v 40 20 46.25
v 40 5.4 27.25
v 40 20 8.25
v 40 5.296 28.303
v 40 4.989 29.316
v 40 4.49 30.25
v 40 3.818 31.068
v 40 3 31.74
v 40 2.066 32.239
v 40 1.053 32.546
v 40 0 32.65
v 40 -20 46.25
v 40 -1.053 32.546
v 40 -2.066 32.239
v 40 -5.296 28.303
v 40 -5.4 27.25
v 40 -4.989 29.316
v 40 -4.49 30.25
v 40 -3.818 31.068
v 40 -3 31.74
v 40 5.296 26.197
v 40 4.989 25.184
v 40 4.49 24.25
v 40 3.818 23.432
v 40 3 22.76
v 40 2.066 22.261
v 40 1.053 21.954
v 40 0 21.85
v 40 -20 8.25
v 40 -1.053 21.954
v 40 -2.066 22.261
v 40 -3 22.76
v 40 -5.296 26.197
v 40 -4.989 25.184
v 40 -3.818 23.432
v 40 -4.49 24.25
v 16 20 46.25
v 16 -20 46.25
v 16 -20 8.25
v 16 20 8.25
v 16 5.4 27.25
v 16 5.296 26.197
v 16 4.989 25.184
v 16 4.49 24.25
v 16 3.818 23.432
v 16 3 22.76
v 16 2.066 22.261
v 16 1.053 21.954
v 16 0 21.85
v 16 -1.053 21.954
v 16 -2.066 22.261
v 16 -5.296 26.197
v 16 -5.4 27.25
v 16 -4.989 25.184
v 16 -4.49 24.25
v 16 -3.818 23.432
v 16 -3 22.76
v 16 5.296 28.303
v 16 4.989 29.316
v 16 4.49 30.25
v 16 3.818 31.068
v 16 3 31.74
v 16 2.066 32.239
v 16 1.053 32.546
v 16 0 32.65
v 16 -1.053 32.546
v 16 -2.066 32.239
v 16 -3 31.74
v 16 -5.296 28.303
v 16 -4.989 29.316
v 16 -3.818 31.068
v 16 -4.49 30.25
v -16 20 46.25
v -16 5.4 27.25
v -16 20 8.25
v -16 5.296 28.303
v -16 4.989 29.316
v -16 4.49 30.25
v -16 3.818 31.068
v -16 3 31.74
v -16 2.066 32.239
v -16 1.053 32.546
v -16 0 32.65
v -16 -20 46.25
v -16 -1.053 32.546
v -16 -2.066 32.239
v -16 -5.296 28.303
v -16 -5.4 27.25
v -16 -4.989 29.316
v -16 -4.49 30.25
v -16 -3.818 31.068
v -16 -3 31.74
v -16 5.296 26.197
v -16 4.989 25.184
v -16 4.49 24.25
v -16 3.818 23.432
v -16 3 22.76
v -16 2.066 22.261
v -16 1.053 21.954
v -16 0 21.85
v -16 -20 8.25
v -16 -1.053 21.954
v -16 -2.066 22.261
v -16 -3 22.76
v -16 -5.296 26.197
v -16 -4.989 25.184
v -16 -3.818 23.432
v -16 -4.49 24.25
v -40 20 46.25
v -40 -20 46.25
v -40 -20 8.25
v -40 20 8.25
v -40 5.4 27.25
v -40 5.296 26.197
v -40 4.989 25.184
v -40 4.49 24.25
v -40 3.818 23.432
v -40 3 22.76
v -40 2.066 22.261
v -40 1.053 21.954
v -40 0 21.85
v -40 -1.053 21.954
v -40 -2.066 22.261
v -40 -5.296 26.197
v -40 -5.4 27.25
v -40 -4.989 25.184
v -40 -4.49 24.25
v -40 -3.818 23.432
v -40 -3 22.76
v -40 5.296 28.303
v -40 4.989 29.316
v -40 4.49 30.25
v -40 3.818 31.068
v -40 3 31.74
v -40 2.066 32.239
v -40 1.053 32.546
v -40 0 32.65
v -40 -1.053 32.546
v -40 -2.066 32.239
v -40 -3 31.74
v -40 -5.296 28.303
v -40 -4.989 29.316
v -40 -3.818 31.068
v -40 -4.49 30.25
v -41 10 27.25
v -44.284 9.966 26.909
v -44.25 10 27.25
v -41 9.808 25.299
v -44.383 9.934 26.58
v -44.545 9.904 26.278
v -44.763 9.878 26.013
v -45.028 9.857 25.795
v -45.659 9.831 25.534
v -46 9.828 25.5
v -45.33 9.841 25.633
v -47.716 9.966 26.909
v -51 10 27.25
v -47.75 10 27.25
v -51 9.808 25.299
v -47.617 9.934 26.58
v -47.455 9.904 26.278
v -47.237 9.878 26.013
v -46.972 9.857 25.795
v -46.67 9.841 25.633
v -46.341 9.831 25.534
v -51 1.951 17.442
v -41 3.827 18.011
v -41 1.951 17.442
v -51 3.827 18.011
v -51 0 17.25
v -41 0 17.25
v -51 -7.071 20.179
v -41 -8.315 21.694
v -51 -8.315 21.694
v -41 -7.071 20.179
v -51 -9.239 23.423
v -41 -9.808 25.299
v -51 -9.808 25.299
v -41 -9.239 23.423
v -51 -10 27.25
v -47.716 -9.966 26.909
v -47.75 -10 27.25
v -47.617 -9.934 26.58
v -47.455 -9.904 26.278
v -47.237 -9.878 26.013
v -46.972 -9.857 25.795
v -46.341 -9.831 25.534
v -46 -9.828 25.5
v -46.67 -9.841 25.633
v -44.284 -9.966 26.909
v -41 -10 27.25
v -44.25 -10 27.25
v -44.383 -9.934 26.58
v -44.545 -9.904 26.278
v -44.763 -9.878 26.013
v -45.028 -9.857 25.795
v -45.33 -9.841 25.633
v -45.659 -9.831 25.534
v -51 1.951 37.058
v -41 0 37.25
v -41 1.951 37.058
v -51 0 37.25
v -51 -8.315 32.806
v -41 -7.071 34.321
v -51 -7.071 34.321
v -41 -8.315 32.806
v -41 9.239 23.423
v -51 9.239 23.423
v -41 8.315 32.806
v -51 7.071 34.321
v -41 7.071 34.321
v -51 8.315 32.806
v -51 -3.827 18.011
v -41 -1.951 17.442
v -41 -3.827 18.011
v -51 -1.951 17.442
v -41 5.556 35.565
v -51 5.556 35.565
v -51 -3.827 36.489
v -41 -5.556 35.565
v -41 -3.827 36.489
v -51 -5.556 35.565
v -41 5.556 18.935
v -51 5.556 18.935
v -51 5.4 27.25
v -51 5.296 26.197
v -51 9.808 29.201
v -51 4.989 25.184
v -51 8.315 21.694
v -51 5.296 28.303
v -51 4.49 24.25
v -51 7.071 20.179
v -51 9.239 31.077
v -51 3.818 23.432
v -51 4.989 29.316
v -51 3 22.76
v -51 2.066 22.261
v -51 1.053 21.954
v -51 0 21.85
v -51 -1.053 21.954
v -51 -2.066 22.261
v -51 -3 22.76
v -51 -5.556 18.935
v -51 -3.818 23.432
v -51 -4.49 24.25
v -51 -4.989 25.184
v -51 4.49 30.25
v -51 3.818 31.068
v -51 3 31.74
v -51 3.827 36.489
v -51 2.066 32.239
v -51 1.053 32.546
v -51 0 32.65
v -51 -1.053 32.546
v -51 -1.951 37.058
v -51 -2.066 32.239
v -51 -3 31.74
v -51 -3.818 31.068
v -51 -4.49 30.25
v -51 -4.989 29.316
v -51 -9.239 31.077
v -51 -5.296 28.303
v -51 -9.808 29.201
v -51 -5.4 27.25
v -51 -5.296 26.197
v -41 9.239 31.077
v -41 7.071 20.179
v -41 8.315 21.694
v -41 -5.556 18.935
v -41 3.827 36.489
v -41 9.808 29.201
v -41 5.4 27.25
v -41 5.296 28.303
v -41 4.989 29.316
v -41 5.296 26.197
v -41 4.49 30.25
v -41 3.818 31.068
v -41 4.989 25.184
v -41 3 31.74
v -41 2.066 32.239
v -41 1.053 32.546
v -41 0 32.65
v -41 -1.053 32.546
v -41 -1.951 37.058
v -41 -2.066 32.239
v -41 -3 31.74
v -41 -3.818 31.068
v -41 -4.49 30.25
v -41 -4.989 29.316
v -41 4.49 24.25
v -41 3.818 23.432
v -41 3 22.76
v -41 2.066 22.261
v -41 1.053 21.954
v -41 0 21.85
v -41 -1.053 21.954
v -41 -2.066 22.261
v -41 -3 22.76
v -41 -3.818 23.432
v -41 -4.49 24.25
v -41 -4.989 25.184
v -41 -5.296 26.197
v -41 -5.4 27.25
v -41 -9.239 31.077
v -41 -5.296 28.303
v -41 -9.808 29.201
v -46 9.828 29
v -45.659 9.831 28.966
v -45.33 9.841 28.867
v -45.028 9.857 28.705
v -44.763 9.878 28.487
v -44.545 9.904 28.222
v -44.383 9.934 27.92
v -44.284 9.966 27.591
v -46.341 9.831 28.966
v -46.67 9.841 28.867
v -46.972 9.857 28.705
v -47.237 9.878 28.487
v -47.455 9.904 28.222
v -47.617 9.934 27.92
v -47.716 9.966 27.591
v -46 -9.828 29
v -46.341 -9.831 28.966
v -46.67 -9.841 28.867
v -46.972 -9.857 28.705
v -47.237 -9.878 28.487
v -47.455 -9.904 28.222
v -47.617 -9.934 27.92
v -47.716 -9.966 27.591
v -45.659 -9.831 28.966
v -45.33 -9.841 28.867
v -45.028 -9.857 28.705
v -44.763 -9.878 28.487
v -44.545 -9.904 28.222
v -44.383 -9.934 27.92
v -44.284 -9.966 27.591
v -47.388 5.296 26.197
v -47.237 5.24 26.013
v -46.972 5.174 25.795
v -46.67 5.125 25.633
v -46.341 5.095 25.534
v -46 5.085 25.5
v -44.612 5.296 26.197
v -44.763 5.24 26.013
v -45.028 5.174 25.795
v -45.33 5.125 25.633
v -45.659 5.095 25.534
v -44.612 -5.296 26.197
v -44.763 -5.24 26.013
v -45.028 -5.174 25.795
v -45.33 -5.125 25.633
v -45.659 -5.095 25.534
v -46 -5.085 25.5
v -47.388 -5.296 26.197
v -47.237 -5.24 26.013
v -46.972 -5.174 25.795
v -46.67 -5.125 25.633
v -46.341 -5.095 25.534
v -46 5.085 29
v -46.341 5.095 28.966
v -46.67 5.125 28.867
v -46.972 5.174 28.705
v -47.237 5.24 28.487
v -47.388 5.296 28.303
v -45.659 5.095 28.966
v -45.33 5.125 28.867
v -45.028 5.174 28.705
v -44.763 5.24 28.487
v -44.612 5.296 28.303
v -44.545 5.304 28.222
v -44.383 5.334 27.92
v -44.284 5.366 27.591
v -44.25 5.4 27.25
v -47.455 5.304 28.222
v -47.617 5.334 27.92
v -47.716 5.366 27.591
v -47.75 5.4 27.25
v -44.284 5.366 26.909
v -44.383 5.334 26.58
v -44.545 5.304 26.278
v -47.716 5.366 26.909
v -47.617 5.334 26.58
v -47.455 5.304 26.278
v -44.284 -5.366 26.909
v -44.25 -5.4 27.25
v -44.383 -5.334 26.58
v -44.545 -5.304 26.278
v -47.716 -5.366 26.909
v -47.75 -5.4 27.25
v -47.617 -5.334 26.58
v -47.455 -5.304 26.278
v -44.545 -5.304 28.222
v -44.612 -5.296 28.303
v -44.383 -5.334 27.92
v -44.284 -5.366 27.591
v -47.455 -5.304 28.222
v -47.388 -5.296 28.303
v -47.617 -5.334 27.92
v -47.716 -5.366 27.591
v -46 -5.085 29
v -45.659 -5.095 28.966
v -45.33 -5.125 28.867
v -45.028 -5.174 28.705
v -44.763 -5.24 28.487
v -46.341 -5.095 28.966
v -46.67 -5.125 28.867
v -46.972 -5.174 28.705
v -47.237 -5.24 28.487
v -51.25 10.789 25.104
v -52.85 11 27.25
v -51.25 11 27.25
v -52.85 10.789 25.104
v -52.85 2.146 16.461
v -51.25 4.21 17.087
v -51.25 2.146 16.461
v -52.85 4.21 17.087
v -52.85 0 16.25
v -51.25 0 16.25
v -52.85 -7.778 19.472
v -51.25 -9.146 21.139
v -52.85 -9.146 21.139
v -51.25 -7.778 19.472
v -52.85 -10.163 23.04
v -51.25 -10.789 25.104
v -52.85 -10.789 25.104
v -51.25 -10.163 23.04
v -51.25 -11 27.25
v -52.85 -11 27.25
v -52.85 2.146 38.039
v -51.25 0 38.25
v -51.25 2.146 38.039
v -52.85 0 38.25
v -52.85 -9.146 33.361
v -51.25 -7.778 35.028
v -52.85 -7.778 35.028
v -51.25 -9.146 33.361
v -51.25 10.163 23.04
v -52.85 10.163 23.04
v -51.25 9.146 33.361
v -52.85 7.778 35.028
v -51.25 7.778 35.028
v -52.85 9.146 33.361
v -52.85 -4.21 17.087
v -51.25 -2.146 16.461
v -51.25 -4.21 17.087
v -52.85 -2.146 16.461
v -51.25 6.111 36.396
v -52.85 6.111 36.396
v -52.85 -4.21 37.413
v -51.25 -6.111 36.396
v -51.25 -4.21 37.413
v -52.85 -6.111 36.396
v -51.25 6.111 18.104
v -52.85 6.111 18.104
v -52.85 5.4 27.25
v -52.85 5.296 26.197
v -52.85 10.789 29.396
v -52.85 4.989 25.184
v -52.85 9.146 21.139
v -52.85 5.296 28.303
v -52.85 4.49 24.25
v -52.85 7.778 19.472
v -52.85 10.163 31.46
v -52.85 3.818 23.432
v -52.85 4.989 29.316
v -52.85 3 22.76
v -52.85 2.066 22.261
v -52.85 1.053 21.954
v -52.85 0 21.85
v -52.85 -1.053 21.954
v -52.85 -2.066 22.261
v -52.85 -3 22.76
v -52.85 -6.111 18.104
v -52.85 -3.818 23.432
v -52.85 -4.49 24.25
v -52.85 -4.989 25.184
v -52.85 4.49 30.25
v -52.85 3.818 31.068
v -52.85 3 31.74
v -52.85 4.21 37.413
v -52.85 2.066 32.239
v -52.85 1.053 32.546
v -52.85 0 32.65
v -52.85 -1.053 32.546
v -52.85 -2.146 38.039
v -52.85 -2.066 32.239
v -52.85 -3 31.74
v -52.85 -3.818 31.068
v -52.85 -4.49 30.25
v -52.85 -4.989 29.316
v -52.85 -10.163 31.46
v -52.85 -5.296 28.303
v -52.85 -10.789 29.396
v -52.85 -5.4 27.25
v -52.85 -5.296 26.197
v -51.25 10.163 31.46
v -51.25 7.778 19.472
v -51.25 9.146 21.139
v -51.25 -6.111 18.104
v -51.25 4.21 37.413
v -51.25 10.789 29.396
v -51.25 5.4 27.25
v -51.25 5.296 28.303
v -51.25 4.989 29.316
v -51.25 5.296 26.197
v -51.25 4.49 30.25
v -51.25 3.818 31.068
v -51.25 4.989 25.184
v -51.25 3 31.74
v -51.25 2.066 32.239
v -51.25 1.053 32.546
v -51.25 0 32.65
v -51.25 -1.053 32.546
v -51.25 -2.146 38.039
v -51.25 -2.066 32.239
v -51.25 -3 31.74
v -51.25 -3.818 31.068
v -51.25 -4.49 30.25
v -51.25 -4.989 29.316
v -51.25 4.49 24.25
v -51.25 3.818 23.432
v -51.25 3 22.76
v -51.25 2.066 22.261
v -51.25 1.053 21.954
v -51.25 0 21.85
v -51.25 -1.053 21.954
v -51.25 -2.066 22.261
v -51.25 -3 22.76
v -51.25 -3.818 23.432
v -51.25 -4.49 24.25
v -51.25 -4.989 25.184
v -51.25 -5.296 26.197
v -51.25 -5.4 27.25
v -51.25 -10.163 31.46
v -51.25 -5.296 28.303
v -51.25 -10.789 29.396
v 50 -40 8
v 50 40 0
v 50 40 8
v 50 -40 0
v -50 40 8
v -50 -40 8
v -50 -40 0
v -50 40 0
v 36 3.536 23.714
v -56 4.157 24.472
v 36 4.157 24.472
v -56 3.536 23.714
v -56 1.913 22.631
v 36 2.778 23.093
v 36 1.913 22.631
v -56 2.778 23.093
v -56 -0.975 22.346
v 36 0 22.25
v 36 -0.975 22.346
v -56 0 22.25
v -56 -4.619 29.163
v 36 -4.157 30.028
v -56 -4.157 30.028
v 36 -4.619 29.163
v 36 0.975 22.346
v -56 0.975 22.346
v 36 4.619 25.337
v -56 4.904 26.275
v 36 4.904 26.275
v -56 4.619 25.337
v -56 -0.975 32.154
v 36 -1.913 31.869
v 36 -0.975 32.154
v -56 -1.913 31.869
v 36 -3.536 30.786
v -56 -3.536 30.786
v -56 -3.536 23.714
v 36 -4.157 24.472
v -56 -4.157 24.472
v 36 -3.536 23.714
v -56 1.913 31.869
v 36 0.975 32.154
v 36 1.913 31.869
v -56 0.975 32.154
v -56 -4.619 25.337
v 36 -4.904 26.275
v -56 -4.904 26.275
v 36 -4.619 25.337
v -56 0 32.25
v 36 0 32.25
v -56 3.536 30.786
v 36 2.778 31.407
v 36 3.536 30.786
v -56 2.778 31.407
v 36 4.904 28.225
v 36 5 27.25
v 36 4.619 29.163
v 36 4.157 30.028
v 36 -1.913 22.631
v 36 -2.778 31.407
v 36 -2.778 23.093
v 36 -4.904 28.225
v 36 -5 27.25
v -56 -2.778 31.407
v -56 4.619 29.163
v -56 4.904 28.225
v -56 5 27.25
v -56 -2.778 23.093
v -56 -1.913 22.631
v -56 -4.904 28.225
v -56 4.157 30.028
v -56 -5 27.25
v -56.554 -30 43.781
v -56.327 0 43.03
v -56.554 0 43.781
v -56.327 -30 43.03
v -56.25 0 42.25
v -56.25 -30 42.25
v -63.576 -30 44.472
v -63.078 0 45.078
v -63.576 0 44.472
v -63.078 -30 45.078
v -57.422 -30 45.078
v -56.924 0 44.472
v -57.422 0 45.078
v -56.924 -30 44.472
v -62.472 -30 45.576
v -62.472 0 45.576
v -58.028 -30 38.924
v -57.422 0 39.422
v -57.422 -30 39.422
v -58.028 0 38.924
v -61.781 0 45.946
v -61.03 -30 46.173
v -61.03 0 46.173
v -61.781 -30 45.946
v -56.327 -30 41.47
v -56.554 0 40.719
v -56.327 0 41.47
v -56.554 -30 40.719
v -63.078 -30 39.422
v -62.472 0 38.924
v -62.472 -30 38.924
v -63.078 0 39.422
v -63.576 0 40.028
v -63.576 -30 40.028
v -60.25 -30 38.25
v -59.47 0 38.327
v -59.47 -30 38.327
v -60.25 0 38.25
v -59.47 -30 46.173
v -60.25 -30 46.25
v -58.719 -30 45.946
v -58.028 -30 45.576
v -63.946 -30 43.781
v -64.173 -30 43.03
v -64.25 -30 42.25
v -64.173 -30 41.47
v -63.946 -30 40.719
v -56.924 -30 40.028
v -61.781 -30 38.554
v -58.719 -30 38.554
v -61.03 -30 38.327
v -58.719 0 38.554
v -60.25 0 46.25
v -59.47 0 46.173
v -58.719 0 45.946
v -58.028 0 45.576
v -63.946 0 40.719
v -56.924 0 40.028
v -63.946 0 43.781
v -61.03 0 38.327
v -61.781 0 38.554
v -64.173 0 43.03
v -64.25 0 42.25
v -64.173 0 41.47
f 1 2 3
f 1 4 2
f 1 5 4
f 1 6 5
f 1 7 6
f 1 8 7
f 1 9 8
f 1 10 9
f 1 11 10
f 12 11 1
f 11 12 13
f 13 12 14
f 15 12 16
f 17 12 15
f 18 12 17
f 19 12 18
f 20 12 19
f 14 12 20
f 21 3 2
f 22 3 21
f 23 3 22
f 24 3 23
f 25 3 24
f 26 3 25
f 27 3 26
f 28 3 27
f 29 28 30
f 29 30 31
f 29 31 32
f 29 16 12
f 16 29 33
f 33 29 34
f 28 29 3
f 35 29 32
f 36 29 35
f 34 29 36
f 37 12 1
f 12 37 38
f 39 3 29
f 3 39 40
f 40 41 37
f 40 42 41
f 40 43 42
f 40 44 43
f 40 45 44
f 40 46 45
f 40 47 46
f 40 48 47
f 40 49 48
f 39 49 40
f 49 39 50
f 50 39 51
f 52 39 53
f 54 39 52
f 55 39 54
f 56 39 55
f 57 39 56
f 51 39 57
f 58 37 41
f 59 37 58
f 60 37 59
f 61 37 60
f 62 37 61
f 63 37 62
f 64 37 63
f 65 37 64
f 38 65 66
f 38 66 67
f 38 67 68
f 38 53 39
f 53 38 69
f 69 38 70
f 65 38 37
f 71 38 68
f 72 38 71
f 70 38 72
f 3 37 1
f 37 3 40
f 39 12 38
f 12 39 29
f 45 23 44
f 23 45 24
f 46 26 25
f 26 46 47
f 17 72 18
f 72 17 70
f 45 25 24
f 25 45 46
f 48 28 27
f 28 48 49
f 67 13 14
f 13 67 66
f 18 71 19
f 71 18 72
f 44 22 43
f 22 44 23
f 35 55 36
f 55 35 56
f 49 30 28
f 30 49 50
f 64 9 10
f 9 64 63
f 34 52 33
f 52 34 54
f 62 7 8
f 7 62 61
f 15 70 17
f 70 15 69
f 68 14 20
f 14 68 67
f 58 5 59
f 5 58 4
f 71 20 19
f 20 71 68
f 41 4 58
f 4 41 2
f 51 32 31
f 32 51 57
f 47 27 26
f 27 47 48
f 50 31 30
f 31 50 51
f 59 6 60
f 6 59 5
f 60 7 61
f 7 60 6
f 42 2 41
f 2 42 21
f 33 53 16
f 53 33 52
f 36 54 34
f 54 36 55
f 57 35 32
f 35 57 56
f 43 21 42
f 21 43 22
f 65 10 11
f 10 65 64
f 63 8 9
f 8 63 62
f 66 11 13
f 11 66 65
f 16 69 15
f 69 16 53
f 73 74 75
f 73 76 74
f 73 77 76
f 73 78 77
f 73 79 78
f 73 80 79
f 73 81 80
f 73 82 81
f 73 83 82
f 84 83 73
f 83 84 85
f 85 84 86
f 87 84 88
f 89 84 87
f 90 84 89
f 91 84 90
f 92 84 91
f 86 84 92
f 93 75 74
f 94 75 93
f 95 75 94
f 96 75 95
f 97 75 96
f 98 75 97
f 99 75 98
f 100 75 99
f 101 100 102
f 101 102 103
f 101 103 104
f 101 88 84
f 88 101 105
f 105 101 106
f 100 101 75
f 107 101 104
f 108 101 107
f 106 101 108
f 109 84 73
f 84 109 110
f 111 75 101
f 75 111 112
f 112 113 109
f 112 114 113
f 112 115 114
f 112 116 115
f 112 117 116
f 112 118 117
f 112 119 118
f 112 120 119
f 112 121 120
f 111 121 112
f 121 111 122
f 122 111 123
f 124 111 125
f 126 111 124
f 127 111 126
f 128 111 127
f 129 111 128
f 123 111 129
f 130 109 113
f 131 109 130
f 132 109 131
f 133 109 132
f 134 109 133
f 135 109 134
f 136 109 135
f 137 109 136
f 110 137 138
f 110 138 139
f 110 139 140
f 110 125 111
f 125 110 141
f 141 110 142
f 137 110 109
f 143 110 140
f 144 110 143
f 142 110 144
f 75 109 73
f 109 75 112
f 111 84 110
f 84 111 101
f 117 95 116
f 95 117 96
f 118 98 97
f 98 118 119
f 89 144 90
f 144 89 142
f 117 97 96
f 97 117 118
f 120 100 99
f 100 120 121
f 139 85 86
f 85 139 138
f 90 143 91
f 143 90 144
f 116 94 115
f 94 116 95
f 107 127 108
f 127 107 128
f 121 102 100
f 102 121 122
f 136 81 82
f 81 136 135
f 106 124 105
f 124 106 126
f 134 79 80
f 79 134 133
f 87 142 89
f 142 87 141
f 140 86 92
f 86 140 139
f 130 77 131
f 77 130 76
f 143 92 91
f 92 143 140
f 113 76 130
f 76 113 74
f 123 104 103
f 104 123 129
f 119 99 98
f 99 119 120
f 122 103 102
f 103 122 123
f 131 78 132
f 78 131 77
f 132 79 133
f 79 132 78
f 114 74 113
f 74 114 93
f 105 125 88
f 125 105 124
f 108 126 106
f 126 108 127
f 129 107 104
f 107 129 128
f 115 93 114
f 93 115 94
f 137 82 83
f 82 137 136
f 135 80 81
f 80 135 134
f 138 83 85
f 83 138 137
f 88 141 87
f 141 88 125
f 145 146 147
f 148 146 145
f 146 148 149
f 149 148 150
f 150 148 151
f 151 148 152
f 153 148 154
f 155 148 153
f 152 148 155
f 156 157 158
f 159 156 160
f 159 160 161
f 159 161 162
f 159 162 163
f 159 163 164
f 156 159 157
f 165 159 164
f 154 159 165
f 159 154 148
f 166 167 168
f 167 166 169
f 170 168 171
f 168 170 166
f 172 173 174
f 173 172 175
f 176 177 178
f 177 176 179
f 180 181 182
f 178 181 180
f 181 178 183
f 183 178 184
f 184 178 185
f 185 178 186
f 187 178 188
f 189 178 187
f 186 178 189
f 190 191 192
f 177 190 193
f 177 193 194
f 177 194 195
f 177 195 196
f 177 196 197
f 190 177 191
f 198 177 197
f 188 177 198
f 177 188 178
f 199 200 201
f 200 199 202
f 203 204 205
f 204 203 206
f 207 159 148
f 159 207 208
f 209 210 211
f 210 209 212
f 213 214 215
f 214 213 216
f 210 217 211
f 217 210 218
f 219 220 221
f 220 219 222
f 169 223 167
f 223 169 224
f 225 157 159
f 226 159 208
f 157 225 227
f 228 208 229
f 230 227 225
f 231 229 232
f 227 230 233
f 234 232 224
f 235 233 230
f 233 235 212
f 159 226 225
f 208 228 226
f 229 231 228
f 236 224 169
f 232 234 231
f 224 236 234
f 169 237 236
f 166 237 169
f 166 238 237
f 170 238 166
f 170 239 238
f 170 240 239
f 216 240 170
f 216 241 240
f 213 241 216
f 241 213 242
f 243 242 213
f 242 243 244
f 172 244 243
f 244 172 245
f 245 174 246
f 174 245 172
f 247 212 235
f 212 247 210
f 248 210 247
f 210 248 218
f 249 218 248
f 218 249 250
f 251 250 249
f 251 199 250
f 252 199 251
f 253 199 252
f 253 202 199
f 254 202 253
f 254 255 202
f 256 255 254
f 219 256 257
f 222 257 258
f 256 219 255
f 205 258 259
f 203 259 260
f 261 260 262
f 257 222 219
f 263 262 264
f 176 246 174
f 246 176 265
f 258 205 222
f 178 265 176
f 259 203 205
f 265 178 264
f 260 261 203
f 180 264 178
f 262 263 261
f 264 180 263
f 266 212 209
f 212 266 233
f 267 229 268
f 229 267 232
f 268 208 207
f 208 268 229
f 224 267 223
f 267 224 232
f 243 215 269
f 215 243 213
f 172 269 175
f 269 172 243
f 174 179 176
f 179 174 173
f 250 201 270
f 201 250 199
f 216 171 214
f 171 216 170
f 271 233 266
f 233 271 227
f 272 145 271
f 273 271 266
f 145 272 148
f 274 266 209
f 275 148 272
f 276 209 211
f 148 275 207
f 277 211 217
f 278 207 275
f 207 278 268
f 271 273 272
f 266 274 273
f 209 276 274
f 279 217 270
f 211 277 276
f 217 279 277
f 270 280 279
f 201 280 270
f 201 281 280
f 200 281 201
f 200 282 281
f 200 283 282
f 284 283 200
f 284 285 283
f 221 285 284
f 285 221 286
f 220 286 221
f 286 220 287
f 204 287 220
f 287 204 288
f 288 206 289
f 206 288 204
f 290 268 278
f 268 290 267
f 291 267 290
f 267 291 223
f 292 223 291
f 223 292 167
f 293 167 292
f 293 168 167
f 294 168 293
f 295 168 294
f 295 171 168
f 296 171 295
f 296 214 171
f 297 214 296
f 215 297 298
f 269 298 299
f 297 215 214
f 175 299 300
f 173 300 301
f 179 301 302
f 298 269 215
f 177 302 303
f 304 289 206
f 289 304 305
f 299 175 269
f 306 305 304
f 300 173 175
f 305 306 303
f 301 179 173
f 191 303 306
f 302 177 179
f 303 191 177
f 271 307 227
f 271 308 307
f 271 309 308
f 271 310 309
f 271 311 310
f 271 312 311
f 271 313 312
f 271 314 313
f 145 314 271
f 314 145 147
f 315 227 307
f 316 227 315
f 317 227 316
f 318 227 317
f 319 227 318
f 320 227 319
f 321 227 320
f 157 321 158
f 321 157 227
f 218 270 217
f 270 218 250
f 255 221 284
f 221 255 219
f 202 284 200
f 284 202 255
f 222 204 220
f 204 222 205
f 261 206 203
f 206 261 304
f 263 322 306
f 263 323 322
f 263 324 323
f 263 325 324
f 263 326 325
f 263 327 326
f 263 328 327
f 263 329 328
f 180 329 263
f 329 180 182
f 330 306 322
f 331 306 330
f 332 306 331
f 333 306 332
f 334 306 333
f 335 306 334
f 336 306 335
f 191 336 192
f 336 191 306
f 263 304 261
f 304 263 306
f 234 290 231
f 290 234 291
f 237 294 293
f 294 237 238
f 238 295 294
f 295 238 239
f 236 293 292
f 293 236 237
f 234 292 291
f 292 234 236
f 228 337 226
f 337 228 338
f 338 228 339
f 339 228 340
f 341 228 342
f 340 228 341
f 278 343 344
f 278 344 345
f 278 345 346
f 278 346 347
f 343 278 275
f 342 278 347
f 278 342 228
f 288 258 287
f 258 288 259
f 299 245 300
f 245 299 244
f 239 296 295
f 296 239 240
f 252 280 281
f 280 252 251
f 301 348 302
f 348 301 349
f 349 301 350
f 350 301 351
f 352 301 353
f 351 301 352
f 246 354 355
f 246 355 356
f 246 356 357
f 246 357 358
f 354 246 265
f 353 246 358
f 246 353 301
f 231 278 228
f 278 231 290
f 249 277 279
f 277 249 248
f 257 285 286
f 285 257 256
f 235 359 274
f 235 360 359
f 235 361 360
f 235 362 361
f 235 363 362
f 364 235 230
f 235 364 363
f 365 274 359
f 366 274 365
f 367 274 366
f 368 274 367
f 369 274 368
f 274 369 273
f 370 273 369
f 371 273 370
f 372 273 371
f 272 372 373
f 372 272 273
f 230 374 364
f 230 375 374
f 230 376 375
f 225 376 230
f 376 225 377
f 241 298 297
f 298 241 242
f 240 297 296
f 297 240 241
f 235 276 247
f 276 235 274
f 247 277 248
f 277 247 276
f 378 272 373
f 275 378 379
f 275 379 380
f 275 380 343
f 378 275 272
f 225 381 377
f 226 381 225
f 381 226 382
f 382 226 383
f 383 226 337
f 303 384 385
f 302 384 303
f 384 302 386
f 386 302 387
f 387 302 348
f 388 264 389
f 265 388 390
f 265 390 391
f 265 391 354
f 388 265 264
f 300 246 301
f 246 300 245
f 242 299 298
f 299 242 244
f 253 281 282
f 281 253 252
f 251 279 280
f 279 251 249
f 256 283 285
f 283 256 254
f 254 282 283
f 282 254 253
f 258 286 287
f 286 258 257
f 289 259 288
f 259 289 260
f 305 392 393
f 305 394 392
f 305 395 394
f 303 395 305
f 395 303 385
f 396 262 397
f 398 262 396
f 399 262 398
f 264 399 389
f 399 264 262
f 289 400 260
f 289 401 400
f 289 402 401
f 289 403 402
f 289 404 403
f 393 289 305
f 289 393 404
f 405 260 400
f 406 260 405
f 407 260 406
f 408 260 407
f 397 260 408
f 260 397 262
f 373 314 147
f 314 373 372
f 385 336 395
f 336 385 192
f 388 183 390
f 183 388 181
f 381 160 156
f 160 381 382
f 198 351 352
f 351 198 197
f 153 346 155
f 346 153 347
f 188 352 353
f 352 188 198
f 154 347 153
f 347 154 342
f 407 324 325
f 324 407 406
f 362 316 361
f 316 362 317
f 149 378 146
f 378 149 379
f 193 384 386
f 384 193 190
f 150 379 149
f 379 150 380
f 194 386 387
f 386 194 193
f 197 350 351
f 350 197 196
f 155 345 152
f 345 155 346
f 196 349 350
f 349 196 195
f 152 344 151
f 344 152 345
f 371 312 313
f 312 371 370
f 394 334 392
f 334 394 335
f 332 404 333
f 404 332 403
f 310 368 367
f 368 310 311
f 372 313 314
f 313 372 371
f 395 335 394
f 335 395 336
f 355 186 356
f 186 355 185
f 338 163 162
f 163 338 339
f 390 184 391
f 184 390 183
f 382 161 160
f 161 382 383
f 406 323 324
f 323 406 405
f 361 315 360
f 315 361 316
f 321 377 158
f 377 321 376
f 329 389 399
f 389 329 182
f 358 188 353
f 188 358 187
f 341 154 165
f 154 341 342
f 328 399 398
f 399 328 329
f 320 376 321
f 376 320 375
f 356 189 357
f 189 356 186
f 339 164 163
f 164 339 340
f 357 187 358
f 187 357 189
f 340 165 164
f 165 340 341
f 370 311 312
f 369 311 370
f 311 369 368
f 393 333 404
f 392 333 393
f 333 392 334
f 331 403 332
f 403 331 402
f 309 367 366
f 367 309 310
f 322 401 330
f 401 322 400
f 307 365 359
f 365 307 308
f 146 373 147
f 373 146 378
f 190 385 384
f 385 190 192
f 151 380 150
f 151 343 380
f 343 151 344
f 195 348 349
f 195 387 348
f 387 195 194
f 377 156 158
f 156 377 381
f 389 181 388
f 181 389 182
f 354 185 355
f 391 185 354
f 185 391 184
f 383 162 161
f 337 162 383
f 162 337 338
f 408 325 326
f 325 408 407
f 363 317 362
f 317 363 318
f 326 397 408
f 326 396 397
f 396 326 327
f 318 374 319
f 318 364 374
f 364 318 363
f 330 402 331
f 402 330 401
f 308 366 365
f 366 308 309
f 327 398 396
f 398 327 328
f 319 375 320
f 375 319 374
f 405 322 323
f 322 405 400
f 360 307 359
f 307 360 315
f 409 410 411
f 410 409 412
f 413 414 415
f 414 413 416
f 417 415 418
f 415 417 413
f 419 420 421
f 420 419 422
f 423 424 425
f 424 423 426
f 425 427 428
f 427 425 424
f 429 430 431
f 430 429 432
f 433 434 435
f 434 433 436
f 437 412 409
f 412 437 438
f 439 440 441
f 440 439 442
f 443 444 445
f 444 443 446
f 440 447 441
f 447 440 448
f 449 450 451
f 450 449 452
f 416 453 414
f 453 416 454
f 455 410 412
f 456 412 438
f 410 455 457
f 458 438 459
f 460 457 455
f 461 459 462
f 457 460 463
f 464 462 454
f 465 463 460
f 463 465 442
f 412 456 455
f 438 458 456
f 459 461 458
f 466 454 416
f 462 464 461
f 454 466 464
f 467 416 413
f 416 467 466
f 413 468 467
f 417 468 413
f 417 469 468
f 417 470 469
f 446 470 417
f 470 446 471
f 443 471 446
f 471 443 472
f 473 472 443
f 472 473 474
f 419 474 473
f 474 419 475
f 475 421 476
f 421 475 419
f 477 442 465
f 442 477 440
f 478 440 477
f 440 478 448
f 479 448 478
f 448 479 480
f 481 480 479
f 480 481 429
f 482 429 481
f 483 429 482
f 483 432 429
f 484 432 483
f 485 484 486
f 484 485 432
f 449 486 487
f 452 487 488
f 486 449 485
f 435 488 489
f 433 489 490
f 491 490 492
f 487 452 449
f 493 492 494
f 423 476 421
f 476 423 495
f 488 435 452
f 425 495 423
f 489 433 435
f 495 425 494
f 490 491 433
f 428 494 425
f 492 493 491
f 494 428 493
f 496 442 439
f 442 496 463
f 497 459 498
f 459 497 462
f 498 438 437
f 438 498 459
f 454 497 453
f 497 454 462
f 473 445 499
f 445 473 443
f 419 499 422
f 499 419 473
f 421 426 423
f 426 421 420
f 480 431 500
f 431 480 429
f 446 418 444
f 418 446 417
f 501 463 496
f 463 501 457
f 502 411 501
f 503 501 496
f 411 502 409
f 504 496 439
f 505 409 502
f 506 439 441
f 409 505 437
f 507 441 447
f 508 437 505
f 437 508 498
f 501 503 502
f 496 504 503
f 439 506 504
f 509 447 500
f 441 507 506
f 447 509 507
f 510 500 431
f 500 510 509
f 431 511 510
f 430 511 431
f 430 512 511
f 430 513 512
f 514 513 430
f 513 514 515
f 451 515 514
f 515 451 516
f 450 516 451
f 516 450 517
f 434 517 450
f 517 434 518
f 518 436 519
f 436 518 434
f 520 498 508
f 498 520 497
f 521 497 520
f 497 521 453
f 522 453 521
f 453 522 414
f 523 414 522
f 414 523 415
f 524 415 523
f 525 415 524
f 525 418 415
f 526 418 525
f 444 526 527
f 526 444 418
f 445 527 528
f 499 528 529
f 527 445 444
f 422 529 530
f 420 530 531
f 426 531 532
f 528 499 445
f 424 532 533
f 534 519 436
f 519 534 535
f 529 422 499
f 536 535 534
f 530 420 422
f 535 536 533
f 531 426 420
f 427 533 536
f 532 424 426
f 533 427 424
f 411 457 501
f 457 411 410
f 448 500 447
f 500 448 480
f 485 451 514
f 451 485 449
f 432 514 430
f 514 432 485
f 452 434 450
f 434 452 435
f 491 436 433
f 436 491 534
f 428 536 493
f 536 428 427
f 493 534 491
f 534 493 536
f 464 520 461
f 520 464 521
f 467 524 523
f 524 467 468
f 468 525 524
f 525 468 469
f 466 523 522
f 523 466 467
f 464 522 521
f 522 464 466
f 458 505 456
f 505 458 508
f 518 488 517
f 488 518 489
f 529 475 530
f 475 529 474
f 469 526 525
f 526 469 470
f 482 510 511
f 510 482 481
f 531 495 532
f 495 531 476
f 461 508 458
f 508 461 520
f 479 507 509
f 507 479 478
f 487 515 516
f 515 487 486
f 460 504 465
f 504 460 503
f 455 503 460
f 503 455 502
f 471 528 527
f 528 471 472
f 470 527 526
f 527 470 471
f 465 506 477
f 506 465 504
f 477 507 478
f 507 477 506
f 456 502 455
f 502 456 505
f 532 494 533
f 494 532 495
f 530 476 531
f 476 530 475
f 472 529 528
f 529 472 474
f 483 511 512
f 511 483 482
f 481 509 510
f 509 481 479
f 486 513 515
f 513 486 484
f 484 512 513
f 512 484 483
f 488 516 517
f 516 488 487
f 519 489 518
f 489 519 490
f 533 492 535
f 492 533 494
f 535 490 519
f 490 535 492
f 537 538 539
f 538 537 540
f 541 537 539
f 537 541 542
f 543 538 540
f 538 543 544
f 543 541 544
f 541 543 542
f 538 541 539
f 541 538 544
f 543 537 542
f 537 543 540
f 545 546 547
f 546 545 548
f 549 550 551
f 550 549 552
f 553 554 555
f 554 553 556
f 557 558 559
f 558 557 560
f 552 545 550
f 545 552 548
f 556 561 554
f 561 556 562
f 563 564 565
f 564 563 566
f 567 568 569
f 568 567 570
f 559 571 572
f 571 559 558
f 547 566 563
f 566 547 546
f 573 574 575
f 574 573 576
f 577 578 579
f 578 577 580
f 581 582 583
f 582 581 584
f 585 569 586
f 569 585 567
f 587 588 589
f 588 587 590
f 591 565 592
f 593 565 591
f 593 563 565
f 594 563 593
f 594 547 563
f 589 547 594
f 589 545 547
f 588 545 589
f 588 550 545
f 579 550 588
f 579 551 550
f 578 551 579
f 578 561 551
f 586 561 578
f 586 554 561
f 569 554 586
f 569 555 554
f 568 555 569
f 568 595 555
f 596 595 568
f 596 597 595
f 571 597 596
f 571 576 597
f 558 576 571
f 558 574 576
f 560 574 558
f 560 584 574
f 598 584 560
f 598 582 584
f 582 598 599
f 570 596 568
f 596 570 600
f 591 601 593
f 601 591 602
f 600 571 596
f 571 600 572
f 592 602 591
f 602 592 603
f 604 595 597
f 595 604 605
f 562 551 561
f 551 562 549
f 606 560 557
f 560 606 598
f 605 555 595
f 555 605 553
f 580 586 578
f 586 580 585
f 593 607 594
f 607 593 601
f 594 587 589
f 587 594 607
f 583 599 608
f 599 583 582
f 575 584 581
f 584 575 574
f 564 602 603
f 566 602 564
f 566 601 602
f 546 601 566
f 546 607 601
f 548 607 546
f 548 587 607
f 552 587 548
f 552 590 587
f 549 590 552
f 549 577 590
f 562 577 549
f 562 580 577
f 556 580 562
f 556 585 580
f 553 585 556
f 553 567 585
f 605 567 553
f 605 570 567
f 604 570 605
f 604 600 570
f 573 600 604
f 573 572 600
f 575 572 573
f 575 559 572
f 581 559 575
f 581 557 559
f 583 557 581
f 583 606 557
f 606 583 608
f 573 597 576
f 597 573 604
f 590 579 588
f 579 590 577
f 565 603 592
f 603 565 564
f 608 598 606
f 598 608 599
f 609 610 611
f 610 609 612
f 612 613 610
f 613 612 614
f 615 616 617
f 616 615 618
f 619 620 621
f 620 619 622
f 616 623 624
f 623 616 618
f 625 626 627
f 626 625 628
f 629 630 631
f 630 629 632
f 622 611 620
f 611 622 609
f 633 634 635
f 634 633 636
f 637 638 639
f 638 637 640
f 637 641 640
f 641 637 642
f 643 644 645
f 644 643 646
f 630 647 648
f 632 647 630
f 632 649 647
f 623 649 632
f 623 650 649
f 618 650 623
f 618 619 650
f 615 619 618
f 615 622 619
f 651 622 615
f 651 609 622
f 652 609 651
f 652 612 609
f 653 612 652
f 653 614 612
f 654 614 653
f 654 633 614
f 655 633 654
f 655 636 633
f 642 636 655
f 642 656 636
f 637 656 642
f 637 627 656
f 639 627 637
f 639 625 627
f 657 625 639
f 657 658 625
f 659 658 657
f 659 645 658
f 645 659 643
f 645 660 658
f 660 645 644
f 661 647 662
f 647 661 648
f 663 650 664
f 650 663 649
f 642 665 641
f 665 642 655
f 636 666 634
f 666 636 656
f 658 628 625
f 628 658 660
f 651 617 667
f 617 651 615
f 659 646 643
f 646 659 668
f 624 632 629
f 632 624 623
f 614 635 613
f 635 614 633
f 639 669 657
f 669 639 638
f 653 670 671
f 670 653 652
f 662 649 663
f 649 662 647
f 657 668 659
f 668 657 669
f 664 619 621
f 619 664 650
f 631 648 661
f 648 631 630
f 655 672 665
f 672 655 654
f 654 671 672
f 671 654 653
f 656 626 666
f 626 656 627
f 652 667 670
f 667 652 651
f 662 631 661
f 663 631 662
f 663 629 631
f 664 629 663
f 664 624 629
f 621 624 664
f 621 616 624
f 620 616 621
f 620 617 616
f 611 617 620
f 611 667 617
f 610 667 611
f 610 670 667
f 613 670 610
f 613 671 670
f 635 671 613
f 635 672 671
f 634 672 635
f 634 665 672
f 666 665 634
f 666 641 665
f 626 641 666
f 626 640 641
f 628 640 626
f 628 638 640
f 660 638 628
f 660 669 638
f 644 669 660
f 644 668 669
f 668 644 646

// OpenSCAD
$fn = 32;

// ------------------------------------------------------------------------
// Machine vise: screw d10, jaws 24 x 38 mm
// Every part is its own module, assembly() places every instance.
// ------------------------------------------------------------------------

// --- part 1 ---
module vise_bed() {
  difference() {
    translate([-50, -40, 0]) cube([100, 80, 8]);
  }
}

// --- part 2 ---
module vise_jaw() {
  difference() {
    translate([-12, -20, 0]) cube([24, 40, 38]);
    translate([0, 0, 19]) rotate([0, 90, 0]) cylinder(h = 26, d = 10.8, center = true);
  }
}

// --- part 3 ---
module vise_screw() {
  translate([0, 0, -46]) cylinder(h = 92, d = 10);
}

// --- part 4 ---
module screw_collar() {
  difference() {
    cylinder(h = 10, d = 20);
    translate([0, 0, -1]) cylinder(h = 12, d = 10.8);
    translate([0, 0, 5]) rotate([90, 0, 0]) cylinder(h = 22, d = 3.5, center = true);
  }
}

// --- part 5 ---
module screw_washer() {
  difference() {
      translate([0, 0, 0]) cylinder(h = 1.6, d = 22);
      translate([0, 0, -1]) cylinder(h = 3.6, d = 10.8);
    }
}

// --- part 6 ---
module vise_handle() {
  cylinder(h = 30, d = 8);
}

// --- assembly ---
module assembly() {
  color([0.80, 0.24, 0.20]) translate([0, 0, 0]) rotate([0, 0, 0]) vise_bed();
  color([0.20, 0.45, 0.75]) translate([28, 0, 8.25]) rotate([0, 0, 0]) vise_jaw();
  color([0.25, 0.62, 0.32]) translate([-28, 0, 8.25]) rotate([0, 0, 0]) vise_jaw();
  color([0.92, 0.70, 0.18]) translate([-10, 0, 27.25]) rotate([0, 90, 0]) vise_screw();
  color([0.58, 0.35, 0.70]) translate([-51, 0, 27.25]) rotate([0, 90, 0]) screw_collar();
  color([0.16, 0.66, 0.66]) translate([-52.85, 0, 27.25]) rotate([0, 90, 0]) screw_washer();
  color([0.85, 0.48, 0.18]) translate([-60.25, 0, 42.25]) rotate([90, 0, 0]) vise_handle();
}

assembly();
